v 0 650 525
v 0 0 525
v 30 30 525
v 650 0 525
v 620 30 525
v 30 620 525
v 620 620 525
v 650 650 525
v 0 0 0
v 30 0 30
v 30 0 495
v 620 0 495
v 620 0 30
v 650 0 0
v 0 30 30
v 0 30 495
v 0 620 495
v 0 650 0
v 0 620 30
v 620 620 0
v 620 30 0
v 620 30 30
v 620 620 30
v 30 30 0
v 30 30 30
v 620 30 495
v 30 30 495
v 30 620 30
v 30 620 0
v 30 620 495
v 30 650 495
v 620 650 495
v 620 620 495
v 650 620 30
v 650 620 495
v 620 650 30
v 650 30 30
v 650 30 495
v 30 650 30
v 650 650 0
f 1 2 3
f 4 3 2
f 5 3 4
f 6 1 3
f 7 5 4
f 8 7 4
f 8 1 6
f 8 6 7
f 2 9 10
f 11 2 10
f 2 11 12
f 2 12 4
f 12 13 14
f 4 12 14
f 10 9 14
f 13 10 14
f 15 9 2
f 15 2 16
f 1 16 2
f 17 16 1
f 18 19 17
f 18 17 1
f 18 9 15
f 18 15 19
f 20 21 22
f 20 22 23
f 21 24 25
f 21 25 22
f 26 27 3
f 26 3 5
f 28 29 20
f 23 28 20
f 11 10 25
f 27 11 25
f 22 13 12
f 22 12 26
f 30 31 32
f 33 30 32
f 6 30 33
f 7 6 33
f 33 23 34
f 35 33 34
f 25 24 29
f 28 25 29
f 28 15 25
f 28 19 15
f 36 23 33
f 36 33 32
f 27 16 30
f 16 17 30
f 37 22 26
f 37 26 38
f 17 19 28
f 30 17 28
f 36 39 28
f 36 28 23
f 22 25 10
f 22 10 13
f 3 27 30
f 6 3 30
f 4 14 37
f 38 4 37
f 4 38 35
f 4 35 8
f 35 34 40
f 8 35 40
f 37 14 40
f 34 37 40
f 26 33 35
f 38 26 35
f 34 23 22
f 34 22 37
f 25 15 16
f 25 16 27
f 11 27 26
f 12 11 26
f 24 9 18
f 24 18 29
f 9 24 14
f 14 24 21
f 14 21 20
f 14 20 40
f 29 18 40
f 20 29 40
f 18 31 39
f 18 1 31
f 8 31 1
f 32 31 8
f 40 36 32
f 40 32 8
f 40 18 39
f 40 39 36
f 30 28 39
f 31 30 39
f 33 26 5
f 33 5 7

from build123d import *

# Parameters (mm, degrees)
BOX006_W     = 650
BOX006_H     = 30
BOX006_DEPTH = 30
BOX007_W     = 650
BOX007_H     = 30
BOX007_DEPTH = 30
BOX008_W     = 30
BOX008_H     = 650
BOX008_DEPTH = 30
BOX005_W     = 30
BOX005_H     = 650
BOX005_DEPTH = 30
BOX004_W     = 30
BOX004_H     = 30
BOX004_DEPTH = 525
BOX003_W     = 30
BOX003_H     = 30
BOX003_DEPTH = 525
BOX002_W     = 30
BOX002_H     = 30
BOX002_DEPTH = 525
BOX001_W     = 30
BOX001_H     = 30
BOX001_DEPTH = 525
BOX010_W     = 650
BOX010_H     = 30
BOX010_DEPTH = 30
BOX011_W     = 650
BOX011_H     = 30
BOX011_DEPTH = 30
BOX012_W     = 30
BOX012_H     = 650
BOX012_DEPTH = 30
BOX009_W     = 30
BOX009_H     = 650
BOX009_DEPTH = 30


with BuildPart() as box006:
    # Box006 → Box006 (new body)
    with BuildSketch(Plane.XY):
        with Locations((325, 15)):
            Rectangle(BOX006_W, BOX006_H)
    extrude(amount=BOX006_DEPTH)


with BuildPart() as box007:
    # Box007 → Box007 (new body)
    with BuildSketch(Plane(origin=(0, 620, 0), x_dir=(1, 0, 0), z_dir=(0, 0, 1))):
        with Locations((325, 15)):
            Rectangle(BOX007_W, BOX007_H)
    extrude(amount=BOX007_DEPTH)


with BuildPart() as box008:
    # Box008 → Box008 (new body)
    with BuildSketch(Plane(origin=(620, 0, 0), x_dir=(1, 0, 0), z_dir=(0, 0, 1))):
        with Locations((15, 325)):
            Rectangle(BOX008_W, BOX008_H)
    extrude(amount=BOX008_DEPTH)


with BuildPart() as horz_inferior:
    # Box005 → Box005 (new body)
    with BuildSketch(Plane.XY):
        with Locations((15, 325)):
            Rectangle(BOX005_W, BOX005_H)
    extrude(amount=BOX005_DEPTH)

    # Fusion: union Box006, Box007, Box008
    add(box006.part)
    add(box007.part)
    add(box008.part)


with BuildPart() as box004:
    # Box004 → Box004 (new body)
    with BuildSketch(Plane(origin=(0, 620, 0), x_dir=(1, 0, 0), z_dir=(0, 0, 1))):
        with Locations((15, 15)):
            Rectangle(BOX004_W, BOX004_H)
    extrude(amount=BOX004_DEPTH)


with BuildPart() as box003:
    # Box003 → Box003 (new body)
    with BuildSketch(Plane(origin=(620, 620, 0), x_dir=(1, 0, 0), z_dir=(0, 0, 1))):
        with Locations((15, 15)):
            Rectangle(BOX003_W, BOX003_H)
    extrude(amount=BOX003_DEPTH)


with BuildPart() as box002:
    # Box002 → Box002 (new body)
    with BuildSketch(Plane(origin=(620, 0, 0), x_dir=(1, 0, 0), z_dir=(0, 0, 1))):
        with Locations((15, 15)):
            Rectangle(BOX002_W, BOX002_H)
    extrude(amount=BOX002_DEPTH)


with BuildPart() as box001:
    # Box001 → Box001 (new body)
    with BuildSketch(Plane.XY):
        with Locations((15, 15)):
            Rectangle(BOX001_W, BOX001_H)
    extrude(amount=BOX001_DEPTH)


with BuildPart() as box010:
    # Box010 → Box010 (new body)
    with BuildSketch(Plane.XY):
        with Locations((325, 15)):
            Rectangle(BOX010_W, BOX010_H)
    extrude(amount=BOX010_DEPTH)


with BuildPart() as box011:
    # Box011 → Box011 (new body)
    with BuildSketch(Plane(origin=(0, 620, 0), x_dir=(1, 0, 0), z_dir=(0, 0, 1))):
        with Locations((325, 15)):
            Rectangle(BOX011_W, BOX011_H)
    extrude(amount=BOX011_DEPTH)


with BuildPart() as box012:
    # Box012 → Box012 (new body)
    with BuildSketch(Plane(origin=(620, 0, 0), x_dir=(1, 0, 0), z_dir=(0, 0, 1))):
        with Locations((15, 325)):
            Rectangle(BOX012_W, BOX012_H)
    extrude(amount=BOX012_DEPTH)


with BuildPart() as parte_superior:
    # Box009 → Box009 (new body)
    with BuildSketch(Plane.XY):
        with Locations((15, 325)):
            Rectangle(BOX009_W, BOX009_H)
    extrude(amount=BOX009_DEPTH)

    # Fusion001: union Box010, Box011, Box012
    add(box010.part)
    add(box011.part)
    add(box012.part)


with BuildPart() as parte_superior_1:
    # Fusion001 placement: moved
    add(parte_superior.part.moved(Location((0, 0, 495))))

    # Fusion002: union Horz Inferior, Box004, Box003, Box002, Box001
    add(horz_inferior.part)
    add(box004.part)
    add(box003.part)
    add(box002.part)
    add(box001.part)


solid = parte_superior_1.part
